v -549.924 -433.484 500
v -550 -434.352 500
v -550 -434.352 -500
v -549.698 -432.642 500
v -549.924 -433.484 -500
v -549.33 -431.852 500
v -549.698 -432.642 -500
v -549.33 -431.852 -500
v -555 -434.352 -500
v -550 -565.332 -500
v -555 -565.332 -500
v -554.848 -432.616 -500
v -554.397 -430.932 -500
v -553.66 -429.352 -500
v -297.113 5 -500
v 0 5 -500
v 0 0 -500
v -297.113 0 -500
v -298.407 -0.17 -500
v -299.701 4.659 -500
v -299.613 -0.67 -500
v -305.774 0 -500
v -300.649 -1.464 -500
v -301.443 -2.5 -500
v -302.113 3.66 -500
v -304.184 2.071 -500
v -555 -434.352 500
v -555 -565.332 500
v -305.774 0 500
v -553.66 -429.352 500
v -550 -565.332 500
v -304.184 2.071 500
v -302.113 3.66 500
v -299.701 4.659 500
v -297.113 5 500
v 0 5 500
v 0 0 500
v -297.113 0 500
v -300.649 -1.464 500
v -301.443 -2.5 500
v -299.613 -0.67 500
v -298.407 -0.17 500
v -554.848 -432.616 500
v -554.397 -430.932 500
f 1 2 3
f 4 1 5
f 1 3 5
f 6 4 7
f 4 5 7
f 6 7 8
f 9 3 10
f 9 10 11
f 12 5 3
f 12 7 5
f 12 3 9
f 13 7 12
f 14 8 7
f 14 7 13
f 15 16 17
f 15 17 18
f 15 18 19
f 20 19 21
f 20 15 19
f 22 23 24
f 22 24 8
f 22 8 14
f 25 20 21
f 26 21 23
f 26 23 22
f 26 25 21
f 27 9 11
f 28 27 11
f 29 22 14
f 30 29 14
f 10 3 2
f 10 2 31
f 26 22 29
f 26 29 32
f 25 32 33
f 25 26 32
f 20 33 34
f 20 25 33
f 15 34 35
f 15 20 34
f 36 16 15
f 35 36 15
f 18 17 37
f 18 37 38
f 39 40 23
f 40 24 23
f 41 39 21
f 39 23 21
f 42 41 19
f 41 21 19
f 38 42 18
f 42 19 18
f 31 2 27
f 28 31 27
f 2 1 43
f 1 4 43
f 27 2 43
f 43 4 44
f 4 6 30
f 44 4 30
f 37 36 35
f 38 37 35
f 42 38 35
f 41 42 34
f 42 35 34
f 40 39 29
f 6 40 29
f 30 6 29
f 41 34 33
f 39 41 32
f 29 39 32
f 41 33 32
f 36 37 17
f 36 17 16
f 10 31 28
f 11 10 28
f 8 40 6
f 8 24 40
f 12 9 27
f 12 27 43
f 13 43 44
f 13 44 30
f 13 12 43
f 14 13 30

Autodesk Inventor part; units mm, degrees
ref_plane "YZ Plane" through (0, 0, 0) normal (1, 0, 0) x (0, 1, 0)
ref_plane "XZ Plane" through (0, 0, 0) normal (0, 1, 0) x (-1, 0, 0)
ref_plane "XY Plane" through (0, 0, 0) normal (0, 0, 1) x (1, 0, 0)
sketch "Sketch1" plane through (0, 0, 0) normal (0, 0, 1) x (1, 0, 0)
  line L0 (0, 0) -> (-300, 0)
  line L1 (-300, 0) -> (-550, -433.0127)
  line L2 (-550, -433.0127) -> (-550, -565.3325)
  dimension "d0" = 300
  dimension "d1" = 500
  dimension "d2" = 120
contour flange "Contour Flange1" sketch "Sketch1" thickness 5 bend radius 5 width 1000 along (0, 0, 1) mid plane yes both sides no wall seen from (-150, 0, 0) lies toward (0, 1, 0) curves L0 L1 L2
bend "Bend1"
corner "Corner1"
equation "\"d3\" = Thickness"
equation "\"d4\" = BendReliefWidth"
equation "\"d5\" = BendReliefDepth"
equation "\"d6\" = MinimumRemnant"
equation "\"d7\" = TransitionRadius"
equation "\"d9\" = BendRadius"
equation "\"d11\" = CornerReliefSize"
equation "\"d12\" = GapSize"
equation "\"d13\" = JacobiRadiusSize"
equation "\"BendRadius\" = Thickness"
equation "\"BendReliefWidth\" = Thickness"
equation "\"BendReliefDepth\" = 0.5 * Thickness"
equation "\"TransitionRadius\" = BendRadius"
equation "\"JacobiRadiusSize\" = BendRadius"
equation "\"GapSize\" = Thickness"
equation "\"Thickness\" = 5"
equation "\"MinimumRemnant\" = 10"
equation "\"CornerReliefSize\" = 20"
properties part number "Part1 example centroid" material "Copper, Wrought"
